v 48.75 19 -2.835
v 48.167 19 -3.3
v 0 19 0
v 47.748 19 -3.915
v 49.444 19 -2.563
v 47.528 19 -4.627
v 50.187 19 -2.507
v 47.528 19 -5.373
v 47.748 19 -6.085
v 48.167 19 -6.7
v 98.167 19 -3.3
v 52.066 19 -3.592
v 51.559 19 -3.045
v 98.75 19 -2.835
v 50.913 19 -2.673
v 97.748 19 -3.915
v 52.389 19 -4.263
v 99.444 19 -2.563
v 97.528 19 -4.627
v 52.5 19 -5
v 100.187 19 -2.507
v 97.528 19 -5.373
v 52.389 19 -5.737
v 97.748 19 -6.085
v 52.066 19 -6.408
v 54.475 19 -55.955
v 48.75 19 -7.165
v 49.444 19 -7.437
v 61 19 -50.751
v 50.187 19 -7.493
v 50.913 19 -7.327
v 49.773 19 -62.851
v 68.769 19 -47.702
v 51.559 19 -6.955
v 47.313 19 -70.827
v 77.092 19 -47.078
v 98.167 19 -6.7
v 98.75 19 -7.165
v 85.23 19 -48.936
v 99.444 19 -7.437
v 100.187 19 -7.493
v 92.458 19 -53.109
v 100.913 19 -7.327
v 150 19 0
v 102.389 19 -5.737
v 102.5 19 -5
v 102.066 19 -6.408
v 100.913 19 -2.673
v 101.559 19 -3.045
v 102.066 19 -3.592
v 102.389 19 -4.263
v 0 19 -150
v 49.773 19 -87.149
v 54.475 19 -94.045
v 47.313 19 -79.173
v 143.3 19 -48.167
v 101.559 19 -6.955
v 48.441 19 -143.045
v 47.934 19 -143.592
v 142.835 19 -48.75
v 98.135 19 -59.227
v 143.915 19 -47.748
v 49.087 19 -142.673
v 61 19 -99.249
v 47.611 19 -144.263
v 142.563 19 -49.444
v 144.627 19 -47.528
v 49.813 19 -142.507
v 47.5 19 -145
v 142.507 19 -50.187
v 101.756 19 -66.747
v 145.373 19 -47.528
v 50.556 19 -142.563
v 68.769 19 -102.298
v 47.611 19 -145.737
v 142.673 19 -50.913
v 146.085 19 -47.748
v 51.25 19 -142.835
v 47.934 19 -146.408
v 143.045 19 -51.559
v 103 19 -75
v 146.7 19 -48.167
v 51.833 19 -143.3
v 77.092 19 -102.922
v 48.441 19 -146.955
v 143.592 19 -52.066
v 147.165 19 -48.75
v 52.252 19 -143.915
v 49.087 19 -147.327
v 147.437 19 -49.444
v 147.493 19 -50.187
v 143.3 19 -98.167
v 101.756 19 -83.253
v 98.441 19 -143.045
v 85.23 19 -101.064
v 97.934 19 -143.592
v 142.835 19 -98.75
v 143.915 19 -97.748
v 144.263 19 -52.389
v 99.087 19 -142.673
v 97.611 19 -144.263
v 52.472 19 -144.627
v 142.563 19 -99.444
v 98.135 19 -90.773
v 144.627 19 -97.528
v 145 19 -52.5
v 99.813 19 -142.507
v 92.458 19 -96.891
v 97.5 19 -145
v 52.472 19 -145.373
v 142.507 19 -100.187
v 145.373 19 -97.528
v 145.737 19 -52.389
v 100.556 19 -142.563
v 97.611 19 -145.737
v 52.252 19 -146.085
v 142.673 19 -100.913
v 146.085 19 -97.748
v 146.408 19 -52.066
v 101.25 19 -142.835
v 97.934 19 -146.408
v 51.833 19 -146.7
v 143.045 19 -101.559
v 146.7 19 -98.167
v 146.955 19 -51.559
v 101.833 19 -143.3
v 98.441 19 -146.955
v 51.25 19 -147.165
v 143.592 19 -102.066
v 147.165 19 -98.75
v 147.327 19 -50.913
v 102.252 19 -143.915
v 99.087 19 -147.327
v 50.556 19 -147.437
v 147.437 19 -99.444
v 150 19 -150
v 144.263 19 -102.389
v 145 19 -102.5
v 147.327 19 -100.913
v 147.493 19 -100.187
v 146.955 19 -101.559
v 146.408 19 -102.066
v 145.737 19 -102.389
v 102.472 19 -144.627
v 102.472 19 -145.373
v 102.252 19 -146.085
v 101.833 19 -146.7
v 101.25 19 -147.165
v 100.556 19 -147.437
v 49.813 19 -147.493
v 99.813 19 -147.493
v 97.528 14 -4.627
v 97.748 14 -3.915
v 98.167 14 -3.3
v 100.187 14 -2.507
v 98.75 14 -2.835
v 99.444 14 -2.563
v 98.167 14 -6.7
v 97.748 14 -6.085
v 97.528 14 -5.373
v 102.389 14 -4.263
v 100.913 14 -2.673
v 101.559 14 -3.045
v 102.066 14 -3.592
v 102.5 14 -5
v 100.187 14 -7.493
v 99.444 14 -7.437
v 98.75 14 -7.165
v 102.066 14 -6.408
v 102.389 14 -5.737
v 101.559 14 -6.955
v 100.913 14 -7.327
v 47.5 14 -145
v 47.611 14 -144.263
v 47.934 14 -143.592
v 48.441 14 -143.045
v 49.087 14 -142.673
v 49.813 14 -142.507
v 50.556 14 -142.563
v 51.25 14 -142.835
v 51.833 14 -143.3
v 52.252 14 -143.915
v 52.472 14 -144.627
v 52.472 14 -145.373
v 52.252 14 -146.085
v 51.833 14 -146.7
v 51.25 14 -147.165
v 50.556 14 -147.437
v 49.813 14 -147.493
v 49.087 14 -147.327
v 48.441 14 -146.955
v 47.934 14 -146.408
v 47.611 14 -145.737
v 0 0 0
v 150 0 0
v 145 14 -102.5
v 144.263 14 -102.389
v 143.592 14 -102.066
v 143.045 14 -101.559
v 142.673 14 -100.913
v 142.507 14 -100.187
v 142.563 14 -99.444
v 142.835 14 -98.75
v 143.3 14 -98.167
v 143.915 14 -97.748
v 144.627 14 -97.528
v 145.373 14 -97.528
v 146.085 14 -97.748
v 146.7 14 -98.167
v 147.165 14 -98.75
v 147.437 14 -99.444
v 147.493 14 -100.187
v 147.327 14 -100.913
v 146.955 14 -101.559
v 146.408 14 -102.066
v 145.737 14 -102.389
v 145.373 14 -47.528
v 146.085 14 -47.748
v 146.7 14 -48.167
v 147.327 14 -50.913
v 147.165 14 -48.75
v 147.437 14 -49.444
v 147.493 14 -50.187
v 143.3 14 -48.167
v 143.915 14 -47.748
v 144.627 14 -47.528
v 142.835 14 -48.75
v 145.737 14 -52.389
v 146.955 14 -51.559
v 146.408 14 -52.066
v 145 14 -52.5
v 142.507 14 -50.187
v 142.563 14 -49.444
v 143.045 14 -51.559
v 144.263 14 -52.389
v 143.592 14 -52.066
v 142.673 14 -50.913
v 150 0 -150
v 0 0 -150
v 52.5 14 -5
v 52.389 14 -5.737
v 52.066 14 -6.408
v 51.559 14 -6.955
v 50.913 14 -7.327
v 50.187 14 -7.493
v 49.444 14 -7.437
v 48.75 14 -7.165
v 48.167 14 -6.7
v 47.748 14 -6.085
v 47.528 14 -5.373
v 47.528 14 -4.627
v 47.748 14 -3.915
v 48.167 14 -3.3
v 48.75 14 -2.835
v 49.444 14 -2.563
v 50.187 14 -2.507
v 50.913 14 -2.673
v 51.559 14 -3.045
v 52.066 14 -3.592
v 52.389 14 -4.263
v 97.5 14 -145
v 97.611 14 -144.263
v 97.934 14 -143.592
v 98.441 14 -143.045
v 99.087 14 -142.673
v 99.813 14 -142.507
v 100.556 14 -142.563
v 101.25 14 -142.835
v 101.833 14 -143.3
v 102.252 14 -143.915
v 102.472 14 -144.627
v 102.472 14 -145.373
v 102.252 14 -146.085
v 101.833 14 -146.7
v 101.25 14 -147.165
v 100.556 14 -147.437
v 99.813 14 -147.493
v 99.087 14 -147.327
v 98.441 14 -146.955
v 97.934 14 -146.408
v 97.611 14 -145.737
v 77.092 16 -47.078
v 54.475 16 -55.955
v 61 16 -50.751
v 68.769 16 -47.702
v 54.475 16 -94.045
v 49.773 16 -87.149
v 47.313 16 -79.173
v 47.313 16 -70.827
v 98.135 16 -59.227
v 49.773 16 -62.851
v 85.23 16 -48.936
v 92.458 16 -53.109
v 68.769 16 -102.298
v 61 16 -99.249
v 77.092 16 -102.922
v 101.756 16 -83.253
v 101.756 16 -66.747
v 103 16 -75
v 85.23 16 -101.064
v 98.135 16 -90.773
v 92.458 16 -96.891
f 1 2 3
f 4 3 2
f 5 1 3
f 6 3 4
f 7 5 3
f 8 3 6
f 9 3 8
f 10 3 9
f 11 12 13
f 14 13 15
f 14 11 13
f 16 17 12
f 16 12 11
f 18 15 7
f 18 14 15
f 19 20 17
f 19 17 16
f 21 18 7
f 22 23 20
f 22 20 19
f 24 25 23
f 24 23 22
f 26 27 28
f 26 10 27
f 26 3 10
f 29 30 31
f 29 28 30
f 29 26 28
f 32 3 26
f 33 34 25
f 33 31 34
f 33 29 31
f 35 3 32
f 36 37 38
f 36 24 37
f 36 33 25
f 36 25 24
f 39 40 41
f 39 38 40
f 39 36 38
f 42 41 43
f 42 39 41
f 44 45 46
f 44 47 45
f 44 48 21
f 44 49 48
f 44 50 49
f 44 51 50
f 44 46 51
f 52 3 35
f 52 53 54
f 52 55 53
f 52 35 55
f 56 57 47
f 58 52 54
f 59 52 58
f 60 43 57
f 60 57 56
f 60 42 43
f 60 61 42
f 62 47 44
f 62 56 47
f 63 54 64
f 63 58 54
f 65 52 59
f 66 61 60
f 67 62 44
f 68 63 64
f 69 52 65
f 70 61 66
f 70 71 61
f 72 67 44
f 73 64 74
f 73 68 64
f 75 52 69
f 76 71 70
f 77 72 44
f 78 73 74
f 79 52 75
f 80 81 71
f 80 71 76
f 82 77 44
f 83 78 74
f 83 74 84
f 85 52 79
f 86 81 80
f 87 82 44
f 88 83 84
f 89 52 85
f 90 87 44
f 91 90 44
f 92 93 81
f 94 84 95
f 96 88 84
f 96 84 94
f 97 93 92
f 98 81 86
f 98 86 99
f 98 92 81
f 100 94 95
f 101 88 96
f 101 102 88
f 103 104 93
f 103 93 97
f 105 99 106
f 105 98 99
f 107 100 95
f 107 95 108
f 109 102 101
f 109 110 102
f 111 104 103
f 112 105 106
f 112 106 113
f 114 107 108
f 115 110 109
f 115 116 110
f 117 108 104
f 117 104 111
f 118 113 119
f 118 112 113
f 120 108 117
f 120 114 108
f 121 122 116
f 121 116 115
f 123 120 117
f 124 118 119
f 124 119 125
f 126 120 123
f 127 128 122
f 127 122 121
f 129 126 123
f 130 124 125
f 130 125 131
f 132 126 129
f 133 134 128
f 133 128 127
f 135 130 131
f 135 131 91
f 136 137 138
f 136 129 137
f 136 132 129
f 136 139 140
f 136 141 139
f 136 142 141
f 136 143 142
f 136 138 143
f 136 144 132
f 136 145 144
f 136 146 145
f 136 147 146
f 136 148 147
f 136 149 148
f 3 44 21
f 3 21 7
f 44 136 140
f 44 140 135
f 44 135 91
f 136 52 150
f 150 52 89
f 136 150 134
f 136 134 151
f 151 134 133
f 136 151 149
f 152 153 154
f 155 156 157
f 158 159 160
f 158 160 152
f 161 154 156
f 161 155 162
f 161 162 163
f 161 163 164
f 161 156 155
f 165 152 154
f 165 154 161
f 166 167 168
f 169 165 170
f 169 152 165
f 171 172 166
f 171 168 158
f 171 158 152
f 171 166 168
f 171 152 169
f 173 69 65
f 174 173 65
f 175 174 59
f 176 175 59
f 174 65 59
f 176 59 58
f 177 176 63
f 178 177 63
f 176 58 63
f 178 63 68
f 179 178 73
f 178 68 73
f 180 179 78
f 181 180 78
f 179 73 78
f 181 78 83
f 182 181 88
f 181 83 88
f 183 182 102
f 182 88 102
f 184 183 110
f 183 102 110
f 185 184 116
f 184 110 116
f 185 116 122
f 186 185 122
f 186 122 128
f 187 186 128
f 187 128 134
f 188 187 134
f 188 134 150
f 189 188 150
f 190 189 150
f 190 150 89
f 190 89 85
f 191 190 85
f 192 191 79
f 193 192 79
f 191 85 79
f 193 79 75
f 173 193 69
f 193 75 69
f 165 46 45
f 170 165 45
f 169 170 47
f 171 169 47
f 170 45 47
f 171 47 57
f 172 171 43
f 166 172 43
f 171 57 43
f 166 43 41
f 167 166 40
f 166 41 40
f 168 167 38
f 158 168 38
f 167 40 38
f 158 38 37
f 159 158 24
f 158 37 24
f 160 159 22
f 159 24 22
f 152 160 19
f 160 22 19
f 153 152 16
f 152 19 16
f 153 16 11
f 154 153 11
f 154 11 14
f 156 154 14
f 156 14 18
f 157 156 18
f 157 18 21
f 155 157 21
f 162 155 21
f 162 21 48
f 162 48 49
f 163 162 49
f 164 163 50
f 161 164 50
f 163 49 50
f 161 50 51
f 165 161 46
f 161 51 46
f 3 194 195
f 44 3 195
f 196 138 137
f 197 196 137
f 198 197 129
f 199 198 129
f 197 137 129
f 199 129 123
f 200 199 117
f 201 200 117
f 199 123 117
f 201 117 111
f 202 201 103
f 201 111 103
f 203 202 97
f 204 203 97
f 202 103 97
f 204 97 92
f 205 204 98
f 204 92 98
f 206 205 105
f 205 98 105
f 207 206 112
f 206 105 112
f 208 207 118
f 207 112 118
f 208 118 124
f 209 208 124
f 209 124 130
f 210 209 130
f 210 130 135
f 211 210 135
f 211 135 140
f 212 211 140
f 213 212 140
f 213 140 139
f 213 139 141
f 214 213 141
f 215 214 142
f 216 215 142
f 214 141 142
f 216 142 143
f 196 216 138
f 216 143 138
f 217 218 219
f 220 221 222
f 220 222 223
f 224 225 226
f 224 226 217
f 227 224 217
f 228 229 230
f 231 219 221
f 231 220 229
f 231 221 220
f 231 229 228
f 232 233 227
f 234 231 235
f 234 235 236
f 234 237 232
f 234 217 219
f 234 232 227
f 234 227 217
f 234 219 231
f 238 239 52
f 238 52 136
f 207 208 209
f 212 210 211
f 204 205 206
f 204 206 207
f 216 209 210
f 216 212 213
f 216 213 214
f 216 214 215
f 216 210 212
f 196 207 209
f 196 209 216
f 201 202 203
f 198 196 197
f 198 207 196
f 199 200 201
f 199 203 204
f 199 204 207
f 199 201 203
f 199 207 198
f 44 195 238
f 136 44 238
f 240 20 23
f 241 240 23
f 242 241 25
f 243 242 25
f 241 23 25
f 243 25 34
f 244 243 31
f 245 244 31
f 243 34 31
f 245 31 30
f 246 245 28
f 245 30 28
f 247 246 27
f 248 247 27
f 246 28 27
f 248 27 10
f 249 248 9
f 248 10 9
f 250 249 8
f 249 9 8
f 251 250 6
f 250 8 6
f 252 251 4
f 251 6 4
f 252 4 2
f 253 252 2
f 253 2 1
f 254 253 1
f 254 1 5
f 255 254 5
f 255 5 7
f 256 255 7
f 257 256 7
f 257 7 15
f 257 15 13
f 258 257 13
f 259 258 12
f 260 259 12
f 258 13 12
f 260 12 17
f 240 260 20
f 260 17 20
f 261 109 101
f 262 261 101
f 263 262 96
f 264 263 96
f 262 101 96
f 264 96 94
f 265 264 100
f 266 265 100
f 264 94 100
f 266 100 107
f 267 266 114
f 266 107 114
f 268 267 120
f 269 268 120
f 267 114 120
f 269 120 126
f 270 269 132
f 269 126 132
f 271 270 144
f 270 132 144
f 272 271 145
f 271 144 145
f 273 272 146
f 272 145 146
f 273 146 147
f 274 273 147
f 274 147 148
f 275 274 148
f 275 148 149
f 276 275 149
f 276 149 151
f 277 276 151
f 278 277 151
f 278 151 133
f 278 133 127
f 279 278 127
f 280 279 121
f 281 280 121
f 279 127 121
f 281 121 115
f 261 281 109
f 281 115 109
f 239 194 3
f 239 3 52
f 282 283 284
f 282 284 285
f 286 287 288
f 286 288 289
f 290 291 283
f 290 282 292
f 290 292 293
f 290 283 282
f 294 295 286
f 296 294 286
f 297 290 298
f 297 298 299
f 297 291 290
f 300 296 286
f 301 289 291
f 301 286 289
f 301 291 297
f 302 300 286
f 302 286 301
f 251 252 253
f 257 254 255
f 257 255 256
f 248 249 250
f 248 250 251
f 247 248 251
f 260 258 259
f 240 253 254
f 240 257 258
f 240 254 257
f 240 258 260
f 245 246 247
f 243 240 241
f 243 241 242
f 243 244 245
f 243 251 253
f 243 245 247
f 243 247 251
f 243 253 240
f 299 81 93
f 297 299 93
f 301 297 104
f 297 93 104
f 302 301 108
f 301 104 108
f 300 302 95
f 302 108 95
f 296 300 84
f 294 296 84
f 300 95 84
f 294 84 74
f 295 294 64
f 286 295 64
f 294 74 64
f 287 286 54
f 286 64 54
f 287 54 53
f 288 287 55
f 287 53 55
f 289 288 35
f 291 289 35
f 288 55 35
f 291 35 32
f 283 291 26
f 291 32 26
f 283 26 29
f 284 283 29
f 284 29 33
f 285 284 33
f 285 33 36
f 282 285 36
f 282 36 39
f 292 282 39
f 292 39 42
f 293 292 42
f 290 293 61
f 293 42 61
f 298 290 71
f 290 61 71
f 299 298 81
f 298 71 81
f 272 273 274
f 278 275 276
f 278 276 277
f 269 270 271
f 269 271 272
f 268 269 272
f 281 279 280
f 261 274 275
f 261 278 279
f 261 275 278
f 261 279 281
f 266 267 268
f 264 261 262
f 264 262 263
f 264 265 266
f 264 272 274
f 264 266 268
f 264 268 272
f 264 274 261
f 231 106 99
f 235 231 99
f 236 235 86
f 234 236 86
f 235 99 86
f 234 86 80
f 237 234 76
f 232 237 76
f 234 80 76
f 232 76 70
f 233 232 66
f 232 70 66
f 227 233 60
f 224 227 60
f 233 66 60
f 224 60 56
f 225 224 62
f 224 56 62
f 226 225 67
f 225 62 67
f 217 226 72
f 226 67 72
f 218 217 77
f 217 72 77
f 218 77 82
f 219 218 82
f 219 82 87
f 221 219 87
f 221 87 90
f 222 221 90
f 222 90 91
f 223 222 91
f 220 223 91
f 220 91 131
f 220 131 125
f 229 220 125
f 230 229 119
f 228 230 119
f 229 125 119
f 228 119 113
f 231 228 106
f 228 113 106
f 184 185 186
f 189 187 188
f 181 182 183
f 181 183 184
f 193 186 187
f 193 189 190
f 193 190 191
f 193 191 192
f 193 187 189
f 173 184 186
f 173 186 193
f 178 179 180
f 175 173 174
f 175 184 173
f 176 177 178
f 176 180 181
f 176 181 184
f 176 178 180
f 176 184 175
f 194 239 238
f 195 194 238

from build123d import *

# Parameters (mm, degrees)
SKETCH1_W           = 150
SKETCH1_H           = 150
BOSS_EXTRUDE1_DEPTH = 19
SKETCH2_R           = 28
CUT_EXTRUDE1_DEPTH  = 3
SKETCH3_R           = 2.5
CUT_EXTRUDE2_DEPTH  = 5
CIRPATTERN1_COUNT   = 3
CIRPATTERN1_ANGLE   = 180


with BuildPart() as part:
    # Sketch1 → Boss-Extrude1 (new body)
    with BuildSketch(Plane(origin=(0, 0, 0), x_dir=(1, 0, 0), z_dir=(0, 1, 0))):
        with Locations((75, 75)):
            Rectangle(SKETCH1_W, SKETCH1_H)
    extrude(amount=BOSS_EXTRUDE1_DEPTH)

    # Sketch2 → Cut-Extrude1 (cut)
    with BuildSketch(Plane(origin=(0, 19, 0), x_dir=(1, 0, 0), z_dir=(0, 1, 0))):
        with Locations((75, 75)):
            Circle(SKETCH2_R)
    extrude(amount=-CUT_EXTRUDE1_DEPTH, mode=Mode.SUBTRACT)

    # Sketch3 → Cut-Extrude2 (cut)
    with BuildSketch(Plane(origin=(0, 19, 0), x_dir=(1, 0, 0), z_dir=(0, 1, 0))):
        with Locations((100, 5)):
            Circle(SKETCH3_R)
        with Locations((50, 5)):
            Circle(SKETCH3_R)
    cut_extrude2 = extrude(amount=-CUT_EXTRUDE2_DEPTH, mode=Mode.SUBTRACT)

    # CirPattern1: Cut-Extrude2 ×3 about axis
    cirpattern1_axis = Axis((75, 16, -75), (0, 1, 0))
    for i in range(1, CIRPATTERN1_COUNT):
        add(cut_extrude2.rotate(cirpattern1_axis, i * CIRPATTERN1_ANGLE / (CIRPATTERN1_COUNT - 1)), mode=Mode.SUBTRACT)


solid = part.part
